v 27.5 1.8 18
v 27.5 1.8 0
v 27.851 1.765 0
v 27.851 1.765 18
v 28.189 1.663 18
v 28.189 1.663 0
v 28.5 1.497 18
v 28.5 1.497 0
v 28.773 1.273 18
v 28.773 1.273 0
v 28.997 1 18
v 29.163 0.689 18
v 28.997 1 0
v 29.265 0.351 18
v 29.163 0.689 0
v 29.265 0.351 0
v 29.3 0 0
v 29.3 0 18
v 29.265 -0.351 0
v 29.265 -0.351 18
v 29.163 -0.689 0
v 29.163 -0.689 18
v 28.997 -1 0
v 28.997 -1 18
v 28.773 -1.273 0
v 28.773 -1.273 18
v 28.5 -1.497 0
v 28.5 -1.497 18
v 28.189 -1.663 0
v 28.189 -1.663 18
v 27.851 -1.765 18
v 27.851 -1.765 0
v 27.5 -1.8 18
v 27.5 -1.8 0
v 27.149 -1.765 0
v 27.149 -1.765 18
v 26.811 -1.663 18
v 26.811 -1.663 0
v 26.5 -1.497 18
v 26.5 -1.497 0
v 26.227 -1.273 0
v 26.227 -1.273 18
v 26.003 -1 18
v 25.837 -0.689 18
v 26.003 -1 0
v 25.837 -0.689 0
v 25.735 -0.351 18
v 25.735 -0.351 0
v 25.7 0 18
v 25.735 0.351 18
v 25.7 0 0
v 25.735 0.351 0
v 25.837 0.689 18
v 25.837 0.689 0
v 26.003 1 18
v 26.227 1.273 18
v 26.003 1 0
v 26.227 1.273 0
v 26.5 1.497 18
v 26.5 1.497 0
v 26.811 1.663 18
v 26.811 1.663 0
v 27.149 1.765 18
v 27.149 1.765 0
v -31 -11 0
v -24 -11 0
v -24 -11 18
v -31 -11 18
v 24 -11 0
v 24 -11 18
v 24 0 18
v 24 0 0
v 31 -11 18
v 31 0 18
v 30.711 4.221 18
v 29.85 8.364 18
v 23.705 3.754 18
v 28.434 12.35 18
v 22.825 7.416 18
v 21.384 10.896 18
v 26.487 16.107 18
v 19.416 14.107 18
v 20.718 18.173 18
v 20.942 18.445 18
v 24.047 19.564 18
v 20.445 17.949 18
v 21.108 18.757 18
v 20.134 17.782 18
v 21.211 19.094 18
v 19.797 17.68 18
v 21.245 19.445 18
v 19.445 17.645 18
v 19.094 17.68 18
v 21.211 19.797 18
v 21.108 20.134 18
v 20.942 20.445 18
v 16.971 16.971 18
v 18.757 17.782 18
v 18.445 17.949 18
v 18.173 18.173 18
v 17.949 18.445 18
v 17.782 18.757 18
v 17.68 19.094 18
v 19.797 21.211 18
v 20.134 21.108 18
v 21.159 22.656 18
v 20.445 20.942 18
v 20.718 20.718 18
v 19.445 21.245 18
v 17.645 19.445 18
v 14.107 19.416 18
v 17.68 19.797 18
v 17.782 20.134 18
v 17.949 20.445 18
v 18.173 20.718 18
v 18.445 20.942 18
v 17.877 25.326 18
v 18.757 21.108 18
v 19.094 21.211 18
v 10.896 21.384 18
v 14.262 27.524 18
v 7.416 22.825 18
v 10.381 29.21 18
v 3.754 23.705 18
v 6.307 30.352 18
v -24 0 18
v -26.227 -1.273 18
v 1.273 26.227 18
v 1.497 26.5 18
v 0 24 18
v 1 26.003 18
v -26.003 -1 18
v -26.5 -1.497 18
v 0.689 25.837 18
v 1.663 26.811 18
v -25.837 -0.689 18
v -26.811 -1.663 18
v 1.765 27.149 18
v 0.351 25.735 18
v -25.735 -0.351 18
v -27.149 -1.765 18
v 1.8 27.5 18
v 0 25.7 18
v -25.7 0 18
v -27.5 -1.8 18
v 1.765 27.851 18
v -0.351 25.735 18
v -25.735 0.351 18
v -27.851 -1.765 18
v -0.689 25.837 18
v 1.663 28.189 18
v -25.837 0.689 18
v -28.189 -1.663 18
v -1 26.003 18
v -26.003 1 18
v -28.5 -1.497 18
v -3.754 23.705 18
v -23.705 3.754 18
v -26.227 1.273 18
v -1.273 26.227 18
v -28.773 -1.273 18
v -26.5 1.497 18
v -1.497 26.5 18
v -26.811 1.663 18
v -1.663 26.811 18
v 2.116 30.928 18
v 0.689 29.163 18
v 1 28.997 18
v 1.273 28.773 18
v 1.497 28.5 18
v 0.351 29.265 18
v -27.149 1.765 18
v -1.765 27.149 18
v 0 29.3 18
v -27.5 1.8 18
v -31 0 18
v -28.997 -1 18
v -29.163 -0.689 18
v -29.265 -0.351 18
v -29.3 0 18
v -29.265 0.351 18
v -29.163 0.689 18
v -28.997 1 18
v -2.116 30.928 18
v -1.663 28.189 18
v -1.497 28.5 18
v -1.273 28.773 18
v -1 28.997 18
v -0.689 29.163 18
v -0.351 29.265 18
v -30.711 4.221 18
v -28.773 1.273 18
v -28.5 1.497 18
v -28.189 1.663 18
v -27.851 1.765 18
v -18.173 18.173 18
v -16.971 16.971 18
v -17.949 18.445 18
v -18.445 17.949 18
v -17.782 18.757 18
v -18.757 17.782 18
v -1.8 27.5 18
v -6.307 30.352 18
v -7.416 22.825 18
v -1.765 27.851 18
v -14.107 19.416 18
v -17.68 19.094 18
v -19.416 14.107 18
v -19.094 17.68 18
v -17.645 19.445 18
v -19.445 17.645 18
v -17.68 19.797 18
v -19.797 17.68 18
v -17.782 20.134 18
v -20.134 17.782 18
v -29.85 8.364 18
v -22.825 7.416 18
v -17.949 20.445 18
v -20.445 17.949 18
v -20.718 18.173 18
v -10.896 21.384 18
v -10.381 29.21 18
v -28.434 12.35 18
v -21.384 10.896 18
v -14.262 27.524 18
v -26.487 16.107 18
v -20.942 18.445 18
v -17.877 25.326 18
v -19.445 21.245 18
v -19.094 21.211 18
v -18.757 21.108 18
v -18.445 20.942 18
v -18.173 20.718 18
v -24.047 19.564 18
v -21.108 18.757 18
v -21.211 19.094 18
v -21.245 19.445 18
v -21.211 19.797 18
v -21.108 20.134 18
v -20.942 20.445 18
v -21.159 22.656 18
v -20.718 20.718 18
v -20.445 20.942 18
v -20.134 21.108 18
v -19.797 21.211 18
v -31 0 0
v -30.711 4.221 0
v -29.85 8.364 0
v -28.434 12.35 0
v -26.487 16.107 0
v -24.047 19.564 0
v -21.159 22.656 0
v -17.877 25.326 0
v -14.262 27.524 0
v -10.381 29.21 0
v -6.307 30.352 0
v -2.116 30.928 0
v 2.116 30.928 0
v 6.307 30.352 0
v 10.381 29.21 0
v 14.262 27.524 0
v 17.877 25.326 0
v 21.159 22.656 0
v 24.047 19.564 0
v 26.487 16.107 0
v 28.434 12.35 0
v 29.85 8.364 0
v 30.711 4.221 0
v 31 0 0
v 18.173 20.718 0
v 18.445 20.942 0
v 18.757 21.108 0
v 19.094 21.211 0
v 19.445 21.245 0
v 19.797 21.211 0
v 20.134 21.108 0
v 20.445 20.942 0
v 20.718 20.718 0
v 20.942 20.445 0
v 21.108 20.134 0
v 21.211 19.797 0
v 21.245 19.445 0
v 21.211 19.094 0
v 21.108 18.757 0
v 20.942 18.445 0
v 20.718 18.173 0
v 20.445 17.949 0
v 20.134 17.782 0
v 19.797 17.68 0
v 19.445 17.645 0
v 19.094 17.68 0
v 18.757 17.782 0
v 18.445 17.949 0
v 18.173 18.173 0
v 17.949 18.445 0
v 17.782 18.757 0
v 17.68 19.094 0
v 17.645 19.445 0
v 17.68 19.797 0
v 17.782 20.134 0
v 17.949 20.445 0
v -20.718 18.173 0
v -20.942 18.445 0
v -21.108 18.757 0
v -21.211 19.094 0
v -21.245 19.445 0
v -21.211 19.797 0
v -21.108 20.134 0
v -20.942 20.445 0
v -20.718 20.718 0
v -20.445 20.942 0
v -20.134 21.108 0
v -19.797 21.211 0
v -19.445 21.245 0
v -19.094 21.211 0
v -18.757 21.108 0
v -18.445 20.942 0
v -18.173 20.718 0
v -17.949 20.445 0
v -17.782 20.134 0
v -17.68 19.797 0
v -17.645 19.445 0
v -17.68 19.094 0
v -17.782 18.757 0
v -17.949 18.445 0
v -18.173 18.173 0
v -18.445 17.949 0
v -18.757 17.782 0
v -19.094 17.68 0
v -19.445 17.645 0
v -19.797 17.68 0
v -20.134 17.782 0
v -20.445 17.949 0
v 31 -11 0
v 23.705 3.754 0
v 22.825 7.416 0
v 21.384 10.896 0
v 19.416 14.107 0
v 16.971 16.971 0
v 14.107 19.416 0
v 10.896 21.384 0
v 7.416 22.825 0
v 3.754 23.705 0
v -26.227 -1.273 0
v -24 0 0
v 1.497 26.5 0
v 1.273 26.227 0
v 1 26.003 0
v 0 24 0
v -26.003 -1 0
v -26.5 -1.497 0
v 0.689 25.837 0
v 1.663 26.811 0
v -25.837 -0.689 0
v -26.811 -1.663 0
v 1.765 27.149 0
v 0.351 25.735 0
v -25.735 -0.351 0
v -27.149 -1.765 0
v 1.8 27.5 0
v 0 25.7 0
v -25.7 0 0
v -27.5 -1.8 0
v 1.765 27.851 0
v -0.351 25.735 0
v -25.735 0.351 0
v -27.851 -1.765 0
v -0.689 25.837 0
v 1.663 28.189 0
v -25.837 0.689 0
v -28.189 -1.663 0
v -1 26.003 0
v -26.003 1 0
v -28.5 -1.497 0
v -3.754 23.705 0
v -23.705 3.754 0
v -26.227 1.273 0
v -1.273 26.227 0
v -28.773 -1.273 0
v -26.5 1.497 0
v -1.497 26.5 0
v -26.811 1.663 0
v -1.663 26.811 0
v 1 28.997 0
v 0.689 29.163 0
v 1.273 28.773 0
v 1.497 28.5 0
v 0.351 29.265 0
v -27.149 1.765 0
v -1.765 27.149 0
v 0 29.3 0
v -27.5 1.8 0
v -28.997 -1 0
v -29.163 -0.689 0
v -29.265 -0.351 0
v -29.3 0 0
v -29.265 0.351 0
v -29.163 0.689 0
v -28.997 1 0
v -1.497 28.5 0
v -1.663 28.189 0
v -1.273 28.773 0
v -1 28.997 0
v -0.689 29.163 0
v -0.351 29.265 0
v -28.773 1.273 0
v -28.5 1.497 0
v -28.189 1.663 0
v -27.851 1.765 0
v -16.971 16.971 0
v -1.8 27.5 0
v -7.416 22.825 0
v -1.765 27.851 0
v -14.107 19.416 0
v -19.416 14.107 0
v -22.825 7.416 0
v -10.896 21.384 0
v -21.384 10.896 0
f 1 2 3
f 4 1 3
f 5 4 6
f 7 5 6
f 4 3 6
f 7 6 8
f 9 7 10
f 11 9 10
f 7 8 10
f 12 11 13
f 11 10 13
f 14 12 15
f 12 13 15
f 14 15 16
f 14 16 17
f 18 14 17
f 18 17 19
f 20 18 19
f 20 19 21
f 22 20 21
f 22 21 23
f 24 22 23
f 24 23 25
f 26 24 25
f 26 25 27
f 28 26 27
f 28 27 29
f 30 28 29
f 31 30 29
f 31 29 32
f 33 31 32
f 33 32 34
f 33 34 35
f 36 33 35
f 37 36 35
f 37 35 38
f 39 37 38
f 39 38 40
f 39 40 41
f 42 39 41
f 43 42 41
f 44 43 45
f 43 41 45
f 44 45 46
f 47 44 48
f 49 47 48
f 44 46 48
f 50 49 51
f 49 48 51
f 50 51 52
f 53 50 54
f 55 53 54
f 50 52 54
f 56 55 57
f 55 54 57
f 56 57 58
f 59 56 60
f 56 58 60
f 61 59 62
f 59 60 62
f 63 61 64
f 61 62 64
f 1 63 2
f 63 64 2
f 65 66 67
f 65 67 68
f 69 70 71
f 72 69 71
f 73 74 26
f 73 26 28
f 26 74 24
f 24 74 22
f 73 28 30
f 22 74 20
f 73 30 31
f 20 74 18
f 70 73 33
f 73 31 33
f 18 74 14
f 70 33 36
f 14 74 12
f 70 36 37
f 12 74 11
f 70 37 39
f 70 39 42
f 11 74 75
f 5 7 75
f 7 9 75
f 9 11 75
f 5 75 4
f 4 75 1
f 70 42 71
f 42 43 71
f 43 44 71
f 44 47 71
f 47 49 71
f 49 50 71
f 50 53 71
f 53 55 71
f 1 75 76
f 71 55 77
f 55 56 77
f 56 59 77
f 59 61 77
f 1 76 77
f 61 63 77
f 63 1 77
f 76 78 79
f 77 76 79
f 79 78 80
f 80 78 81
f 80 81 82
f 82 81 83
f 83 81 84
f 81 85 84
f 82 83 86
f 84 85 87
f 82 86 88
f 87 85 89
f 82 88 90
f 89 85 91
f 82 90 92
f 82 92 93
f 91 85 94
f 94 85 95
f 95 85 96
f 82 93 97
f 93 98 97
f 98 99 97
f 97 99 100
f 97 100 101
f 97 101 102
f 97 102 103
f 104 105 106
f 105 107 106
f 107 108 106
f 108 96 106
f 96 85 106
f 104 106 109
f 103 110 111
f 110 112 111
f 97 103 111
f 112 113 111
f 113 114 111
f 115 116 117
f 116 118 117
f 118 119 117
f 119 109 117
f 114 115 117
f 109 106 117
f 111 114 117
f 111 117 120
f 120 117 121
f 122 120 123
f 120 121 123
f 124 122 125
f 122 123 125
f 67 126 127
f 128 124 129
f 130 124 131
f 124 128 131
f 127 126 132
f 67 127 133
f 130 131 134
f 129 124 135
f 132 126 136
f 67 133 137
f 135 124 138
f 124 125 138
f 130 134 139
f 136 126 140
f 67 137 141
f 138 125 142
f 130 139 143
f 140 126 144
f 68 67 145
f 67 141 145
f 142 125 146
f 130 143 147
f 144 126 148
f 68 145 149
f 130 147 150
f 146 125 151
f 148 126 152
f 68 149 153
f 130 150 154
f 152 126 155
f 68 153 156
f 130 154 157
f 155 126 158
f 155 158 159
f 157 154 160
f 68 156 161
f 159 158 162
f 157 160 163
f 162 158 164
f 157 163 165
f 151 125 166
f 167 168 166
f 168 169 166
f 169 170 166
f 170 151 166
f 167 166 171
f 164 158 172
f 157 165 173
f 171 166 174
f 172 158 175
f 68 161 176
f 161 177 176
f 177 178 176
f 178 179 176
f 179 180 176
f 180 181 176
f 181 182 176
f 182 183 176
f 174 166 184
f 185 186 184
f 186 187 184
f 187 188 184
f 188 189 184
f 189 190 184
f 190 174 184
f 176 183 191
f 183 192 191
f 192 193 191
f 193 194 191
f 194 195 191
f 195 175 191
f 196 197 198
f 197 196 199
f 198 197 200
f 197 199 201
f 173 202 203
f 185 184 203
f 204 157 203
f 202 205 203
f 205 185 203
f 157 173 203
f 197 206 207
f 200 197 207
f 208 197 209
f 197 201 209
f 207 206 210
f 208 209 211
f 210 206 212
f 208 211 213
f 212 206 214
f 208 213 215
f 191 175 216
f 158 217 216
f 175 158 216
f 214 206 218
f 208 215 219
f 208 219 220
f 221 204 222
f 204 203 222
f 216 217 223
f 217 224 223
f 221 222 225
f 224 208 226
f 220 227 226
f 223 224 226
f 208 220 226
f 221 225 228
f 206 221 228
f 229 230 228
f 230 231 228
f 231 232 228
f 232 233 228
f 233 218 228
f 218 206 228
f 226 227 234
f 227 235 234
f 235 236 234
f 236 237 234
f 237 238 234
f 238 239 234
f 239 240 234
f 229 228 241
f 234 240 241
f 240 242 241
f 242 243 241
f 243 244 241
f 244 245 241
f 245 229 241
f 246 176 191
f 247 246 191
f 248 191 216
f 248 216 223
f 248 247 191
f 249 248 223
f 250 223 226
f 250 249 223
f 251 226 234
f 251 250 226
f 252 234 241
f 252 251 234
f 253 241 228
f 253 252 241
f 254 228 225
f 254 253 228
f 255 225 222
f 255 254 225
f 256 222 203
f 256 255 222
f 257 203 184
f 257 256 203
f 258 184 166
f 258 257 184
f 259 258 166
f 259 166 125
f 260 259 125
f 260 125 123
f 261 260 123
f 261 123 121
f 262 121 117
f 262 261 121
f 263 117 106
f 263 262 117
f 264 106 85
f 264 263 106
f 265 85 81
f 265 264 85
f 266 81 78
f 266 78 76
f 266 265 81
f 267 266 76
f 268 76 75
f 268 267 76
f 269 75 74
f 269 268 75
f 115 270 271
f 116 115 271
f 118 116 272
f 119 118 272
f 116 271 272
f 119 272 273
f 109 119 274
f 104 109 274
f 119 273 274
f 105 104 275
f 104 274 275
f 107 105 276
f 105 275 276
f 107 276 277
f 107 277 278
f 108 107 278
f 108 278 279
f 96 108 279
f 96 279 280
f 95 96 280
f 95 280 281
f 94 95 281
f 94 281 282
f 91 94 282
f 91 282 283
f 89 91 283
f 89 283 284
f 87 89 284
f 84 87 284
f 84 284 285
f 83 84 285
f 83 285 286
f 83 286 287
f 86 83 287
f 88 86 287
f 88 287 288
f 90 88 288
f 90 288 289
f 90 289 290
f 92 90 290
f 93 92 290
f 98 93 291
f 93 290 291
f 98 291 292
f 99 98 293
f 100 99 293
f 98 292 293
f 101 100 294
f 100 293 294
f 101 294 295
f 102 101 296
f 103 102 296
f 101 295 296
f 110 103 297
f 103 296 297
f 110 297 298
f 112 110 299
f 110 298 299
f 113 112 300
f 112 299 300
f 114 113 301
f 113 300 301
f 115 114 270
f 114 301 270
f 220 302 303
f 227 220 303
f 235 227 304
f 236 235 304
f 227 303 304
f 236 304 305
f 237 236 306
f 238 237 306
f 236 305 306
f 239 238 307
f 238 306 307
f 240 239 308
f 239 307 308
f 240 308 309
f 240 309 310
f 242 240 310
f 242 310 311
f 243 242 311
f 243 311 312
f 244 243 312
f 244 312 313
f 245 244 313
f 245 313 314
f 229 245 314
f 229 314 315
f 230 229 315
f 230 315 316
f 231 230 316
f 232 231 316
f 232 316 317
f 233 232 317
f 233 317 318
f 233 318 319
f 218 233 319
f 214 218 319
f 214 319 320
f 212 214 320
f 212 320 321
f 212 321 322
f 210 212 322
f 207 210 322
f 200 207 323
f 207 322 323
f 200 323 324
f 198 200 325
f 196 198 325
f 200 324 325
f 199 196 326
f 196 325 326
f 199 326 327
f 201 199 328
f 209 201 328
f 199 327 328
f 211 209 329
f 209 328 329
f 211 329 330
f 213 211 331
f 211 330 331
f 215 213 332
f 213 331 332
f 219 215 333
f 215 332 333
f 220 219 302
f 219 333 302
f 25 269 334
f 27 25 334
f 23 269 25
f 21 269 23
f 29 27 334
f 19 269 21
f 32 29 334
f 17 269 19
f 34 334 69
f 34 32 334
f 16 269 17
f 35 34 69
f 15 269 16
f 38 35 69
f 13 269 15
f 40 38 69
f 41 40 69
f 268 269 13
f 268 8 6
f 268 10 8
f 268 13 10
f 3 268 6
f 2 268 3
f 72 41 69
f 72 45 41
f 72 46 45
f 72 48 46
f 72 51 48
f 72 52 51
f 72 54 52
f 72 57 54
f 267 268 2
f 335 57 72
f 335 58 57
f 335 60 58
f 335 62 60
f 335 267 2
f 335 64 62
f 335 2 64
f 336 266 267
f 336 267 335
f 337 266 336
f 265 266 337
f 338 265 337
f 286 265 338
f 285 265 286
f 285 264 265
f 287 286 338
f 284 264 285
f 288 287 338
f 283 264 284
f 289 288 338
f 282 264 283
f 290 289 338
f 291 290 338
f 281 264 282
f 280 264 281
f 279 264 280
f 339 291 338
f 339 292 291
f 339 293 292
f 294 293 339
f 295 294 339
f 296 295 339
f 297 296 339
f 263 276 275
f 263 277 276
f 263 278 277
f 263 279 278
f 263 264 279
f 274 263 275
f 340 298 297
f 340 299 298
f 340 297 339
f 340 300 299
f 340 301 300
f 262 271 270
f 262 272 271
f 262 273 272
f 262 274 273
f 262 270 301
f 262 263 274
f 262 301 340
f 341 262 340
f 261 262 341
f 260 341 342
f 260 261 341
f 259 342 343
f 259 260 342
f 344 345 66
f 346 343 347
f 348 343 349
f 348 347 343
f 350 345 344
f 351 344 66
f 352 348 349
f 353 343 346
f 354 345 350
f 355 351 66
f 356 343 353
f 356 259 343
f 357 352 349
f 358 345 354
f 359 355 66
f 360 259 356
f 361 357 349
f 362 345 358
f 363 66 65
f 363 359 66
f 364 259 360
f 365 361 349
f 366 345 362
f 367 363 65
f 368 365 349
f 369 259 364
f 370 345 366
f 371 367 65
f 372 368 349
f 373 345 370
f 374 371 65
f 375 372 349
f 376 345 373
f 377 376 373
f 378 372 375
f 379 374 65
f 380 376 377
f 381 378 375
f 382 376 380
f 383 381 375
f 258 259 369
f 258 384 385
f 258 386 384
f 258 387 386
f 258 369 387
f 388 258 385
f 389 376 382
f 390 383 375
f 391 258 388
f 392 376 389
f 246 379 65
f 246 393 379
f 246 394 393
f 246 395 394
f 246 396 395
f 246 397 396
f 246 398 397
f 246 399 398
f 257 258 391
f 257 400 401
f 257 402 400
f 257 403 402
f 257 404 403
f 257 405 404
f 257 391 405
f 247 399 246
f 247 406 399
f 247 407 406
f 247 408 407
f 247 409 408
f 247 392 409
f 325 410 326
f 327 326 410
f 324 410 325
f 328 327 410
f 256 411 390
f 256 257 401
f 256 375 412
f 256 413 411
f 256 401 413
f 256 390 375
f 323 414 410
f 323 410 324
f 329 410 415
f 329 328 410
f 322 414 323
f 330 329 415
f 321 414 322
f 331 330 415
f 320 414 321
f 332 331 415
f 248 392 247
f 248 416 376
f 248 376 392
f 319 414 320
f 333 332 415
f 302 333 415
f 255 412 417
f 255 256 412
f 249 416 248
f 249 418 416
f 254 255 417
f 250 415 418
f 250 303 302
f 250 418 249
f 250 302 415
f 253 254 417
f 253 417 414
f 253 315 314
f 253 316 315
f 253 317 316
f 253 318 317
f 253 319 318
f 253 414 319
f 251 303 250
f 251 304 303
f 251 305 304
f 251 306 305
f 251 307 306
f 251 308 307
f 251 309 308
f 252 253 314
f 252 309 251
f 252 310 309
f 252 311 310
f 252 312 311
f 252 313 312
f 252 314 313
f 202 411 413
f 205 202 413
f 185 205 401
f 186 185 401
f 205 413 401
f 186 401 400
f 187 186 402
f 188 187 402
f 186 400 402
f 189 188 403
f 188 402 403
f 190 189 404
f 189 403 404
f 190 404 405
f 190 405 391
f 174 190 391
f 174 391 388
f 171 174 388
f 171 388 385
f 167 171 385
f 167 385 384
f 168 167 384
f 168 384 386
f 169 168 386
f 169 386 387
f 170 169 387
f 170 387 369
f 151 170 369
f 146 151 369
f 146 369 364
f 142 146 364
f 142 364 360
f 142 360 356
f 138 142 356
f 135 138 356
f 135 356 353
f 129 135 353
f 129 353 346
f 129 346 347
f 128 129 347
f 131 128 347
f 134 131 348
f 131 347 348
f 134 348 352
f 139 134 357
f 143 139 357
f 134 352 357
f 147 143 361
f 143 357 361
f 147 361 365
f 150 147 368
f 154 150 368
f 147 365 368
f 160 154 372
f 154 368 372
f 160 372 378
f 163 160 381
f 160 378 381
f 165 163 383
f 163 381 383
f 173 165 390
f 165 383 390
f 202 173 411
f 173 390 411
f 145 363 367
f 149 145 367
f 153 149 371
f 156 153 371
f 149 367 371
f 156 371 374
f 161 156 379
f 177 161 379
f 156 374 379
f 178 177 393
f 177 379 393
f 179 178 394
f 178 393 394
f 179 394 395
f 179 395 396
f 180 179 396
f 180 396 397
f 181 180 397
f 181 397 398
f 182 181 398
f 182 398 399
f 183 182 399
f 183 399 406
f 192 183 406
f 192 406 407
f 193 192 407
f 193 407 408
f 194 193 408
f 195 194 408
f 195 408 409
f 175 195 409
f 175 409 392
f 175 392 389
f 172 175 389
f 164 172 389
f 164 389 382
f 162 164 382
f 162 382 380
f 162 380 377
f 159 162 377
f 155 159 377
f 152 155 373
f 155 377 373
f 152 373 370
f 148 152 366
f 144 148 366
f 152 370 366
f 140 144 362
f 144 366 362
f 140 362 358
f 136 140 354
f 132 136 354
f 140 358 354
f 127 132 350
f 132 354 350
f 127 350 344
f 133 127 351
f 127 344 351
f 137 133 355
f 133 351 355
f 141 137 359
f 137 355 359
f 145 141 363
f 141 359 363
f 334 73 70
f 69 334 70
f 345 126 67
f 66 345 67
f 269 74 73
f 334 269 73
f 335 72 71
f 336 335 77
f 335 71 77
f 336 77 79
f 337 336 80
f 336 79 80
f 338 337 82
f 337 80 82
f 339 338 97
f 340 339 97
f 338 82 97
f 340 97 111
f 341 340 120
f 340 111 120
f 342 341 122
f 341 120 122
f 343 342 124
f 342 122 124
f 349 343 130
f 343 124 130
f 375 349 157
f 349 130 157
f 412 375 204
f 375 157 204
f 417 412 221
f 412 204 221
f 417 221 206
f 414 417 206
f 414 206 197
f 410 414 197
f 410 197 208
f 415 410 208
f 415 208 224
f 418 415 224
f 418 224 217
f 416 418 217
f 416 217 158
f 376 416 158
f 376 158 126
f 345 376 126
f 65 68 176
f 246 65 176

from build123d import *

# Parameters (mm, degrees)
EXTRUDE_1_DEPTH          = 18
CUT_EXTRUDE_1_DEPTH      = 19
HOLE_WIZARD_M3_1_D       = 3.6
PATTERN_CIRCULAR_1_COUNT = 8


with BuildPart() as part:
    # ｽｹｯﾁ1 → ﾎﾞｽ - 押し出し1 (new body)
    with BuildSketch(Plane.XY):
        with BuildLine():
            ThreePointArc((-31, 0), (0, 31), (31, 0))
            Line((31, 0), (31, -11))
            Line((31, -11), (-31, -11))
            Line((-31, -11), (-31, 0))
        make_face()
    extrude(amount=EXTRUDE_1_DEPTH)

    # ｽｹｯﾁ2 → ｶｯﾄ - 押し出し1 (cut, through all)
    with BuildSketch(Plane.XY.offset(18)):
        with BuildLine():
            Line((-24, 0), (-24, -11))
            Line((-24, -11), (24, -11))
            Line((24, -11), (24, 0))
            ThreePointArc((24, 0), (0, 24), (-24, 0))
        make_face()
    extrude(amount=-CUT_EXTRUDE_1_DEPTH, mode=Mode.SUBTRACT)

    # M3 すきま穴1 (through all)
    with Locations(Plane.XY.offset(18)):
        with Locations((0, 27.5)):
            hole_wizard_m3_1 = Hole(HOLE_WIZARD_M3_1_D / 2)

    # 円形ﾊﾟﾀｰﾝ1: M3 すきま穴1 ×8 about axis, 3 skipped
    pattern_circular_1_axis = Axis((0, 0, 0), (0, 0, -1))
    add([hole_wizard_m3_1.rotate(pattern_circular_1_axis, i * 360 / PATTERN_CIRCULAR_1_COUNT) for i in range(1, PATTERN_CIRCULAR_1_COUNT) if i not in (3, 4, 5)], mode=Mode.SUBTRACT)


solid = part.part
